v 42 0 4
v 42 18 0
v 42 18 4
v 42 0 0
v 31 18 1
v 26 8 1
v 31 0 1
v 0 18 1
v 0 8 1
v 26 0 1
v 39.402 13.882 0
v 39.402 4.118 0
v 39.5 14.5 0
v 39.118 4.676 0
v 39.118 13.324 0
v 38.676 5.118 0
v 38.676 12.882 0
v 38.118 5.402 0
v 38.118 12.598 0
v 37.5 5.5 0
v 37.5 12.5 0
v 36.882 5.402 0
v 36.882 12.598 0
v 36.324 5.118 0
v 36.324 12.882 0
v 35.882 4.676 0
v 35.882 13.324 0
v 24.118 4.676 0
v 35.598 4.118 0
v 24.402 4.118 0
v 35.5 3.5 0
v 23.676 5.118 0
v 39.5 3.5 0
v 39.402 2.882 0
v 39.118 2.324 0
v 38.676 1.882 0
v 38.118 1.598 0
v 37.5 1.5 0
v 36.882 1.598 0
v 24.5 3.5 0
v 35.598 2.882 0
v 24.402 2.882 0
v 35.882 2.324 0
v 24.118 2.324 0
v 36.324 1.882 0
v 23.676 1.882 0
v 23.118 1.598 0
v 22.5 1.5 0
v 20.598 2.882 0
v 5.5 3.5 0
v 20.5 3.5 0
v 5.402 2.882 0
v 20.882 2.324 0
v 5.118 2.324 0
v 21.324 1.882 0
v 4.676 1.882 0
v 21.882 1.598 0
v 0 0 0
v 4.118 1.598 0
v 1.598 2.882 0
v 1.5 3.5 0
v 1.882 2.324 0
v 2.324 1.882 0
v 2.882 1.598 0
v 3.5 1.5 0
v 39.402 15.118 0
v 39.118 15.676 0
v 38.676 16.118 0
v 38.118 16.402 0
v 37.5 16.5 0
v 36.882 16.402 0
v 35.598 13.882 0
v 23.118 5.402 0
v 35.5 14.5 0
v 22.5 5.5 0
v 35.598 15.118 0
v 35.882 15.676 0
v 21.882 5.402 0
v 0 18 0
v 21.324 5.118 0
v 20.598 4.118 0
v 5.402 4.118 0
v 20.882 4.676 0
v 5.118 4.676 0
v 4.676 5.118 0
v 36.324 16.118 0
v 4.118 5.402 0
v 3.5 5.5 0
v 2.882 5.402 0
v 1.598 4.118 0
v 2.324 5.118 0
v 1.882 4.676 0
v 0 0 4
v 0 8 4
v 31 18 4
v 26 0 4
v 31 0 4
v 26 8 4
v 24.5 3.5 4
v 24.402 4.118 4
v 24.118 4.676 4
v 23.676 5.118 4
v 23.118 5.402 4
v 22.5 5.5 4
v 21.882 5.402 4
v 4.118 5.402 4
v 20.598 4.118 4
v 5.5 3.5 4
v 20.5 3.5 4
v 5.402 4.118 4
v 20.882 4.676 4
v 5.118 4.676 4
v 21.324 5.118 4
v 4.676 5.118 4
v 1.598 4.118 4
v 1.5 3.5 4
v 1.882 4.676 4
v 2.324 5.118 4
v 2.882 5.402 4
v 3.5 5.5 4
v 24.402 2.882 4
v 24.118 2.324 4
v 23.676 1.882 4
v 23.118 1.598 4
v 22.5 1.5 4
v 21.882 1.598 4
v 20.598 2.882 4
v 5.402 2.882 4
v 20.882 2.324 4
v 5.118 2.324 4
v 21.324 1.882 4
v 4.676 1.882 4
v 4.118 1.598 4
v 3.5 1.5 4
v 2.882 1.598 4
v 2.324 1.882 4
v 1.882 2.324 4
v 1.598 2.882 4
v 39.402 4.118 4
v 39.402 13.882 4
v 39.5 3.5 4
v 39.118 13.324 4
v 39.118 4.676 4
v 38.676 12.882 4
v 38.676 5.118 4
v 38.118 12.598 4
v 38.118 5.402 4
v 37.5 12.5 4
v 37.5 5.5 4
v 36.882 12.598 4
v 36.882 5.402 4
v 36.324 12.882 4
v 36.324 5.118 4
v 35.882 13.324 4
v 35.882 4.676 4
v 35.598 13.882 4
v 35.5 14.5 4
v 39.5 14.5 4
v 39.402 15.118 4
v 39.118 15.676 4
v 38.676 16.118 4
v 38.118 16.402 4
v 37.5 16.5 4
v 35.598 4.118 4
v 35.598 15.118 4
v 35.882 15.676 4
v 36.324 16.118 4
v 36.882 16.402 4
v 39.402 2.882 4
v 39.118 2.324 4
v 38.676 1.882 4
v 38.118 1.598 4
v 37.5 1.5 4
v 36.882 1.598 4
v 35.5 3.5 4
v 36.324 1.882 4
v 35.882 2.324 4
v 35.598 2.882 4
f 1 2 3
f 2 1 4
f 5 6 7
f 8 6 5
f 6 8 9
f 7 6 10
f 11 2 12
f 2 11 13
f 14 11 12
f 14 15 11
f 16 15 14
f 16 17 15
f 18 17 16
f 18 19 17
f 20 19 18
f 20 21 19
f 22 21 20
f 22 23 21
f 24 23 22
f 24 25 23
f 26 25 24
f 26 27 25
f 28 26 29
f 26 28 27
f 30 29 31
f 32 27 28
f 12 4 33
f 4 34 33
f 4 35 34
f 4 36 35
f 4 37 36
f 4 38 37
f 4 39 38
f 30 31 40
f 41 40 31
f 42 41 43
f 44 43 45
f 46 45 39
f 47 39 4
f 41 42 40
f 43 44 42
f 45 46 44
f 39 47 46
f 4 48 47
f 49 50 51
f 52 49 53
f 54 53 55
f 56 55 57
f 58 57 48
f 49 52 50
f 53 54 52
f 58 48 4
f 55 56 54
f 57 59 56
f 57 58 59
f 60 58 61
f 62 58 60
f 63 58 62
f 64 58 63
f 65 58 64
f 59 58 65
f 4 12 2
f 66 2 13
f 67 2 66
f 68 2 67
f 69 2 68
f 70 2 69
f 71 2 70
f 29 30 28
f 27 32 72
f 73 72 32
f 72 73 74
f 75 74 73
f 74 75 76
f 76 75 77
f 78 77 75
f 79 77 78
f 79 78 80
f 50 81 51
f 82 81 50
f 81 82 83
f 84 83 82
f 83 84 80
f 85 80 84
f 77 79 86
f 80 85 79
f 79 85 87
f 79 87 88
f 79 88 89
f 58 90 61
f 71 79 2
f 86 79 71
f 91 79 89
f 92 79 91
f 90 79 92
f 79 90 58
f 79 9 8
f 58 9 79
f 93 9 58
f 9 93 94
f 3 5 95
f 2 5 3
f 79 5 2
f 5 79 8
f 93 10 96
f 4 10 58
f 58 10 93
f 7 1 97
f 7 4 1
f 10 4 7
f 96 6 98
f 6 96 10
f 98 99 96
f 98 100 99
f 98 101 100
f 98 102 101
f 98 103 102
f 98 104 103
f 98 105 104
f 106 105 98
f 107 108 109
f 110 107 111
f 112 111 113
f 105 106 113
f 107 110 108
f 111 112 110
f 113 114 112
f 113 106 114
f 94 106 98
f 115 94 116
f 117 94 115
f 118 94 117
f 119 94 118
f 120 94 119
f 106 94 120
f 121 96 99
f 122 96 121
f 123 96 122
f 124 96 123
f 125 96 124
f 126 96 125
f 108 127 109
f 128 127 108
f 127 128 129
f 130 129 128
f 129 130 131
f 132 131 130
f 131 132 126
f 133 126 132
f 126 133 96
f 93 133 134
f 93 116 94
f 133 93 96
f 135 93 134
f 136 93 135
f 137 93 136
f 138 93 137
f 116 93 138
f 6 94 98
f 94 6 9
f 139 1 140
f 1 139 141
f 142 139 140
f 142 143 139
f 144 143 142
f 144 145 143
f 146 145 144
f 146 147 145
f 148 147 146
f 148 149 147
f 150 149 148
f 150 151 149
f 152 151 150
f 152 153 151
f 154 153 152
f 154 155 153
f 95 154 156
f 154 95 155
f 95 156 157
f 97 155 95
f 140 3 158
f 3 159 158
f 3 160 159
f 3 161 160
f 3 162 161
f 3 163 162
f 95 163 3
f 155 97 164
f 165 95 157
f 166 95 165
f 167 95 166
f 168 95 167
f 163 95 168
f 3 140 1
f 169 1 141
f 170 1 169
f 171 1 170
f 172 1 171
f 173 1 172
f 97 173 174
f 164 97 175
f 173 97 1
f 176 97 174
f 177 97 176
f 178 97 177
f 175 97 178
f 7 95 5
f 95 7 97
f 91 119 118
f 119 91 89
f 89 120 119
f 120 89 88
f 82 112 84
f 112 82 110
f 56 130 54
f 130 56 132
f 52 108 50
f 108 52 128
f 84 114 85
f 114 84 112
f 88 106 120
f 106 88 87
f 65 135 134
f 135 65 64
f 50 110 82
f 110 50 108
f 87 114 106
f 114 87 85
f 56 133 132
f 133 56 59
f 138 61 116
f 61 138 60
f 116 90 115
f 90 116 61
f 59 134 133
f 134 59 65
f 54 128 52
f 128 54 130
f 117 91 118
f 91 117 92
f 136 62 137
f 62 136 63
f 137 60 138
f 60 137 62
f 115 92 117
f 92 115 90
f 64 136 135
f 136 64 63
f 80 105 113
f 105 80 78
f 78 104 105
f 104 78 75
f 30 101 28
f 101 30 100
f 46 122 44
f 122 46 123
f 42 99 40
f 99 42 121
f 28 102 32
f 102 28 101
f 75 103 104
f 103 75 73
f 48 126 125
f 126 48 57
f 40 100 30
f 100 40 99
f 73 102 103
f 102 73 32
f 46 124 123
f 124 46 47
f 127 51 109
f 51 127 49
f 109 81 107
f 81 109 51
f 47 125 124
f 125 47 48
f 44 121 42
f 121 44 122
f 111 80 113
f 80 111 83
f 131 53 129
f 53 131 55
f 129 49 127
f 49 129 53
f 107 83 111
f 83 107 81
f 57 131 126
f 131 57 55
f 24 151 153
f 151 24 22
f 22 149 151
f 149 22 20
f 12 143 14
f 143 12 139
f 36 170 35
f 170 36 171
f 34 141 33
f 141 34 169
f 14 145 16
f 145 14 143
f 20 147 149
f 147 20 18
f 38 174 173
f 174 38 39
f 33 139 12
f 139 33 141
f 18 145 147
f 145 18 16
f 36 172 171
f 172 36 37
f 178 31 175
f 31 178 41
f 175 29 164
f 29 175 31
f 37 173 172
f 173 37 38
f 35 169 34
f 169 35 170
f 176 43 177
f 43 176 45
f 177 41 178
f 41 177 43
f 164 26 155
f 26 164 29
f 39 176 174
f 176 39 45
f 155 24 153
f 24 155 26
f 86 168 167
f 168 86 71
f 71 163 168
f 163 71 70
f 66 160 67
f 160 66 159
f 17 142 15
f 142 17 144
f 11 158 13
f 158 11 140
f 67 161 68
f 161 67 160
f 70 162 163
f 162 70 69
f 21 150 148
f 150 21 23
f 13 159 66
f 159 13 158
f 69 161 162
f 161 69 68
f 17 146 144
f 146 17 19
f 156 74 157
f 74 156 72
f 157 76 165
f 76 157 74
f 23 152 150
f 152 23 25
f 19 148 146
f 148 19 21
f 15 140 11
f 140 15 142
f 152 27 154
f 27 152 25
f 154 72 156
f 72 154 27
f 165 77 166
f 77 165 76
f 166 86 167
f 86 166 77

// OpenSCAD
$fn=20;

module hole() {
    translate([0,0,-1]) rotate([0,0,90]) cylinder(d=4, h=6);
}

difference() {
    union() {
        cube([42,18,1]);
        translate([0,0,1])
            cube([26,8,3]);
        translate([31,0,1])
            cube([11,18,3]);
    }
    translate([3.5,3.5,0]) hole();
    translate([22.5,3.5,0]) hole();
    translate([37.5,3.5,0]) hole();
    translate([37.5,14.5,0]) hole();
}
